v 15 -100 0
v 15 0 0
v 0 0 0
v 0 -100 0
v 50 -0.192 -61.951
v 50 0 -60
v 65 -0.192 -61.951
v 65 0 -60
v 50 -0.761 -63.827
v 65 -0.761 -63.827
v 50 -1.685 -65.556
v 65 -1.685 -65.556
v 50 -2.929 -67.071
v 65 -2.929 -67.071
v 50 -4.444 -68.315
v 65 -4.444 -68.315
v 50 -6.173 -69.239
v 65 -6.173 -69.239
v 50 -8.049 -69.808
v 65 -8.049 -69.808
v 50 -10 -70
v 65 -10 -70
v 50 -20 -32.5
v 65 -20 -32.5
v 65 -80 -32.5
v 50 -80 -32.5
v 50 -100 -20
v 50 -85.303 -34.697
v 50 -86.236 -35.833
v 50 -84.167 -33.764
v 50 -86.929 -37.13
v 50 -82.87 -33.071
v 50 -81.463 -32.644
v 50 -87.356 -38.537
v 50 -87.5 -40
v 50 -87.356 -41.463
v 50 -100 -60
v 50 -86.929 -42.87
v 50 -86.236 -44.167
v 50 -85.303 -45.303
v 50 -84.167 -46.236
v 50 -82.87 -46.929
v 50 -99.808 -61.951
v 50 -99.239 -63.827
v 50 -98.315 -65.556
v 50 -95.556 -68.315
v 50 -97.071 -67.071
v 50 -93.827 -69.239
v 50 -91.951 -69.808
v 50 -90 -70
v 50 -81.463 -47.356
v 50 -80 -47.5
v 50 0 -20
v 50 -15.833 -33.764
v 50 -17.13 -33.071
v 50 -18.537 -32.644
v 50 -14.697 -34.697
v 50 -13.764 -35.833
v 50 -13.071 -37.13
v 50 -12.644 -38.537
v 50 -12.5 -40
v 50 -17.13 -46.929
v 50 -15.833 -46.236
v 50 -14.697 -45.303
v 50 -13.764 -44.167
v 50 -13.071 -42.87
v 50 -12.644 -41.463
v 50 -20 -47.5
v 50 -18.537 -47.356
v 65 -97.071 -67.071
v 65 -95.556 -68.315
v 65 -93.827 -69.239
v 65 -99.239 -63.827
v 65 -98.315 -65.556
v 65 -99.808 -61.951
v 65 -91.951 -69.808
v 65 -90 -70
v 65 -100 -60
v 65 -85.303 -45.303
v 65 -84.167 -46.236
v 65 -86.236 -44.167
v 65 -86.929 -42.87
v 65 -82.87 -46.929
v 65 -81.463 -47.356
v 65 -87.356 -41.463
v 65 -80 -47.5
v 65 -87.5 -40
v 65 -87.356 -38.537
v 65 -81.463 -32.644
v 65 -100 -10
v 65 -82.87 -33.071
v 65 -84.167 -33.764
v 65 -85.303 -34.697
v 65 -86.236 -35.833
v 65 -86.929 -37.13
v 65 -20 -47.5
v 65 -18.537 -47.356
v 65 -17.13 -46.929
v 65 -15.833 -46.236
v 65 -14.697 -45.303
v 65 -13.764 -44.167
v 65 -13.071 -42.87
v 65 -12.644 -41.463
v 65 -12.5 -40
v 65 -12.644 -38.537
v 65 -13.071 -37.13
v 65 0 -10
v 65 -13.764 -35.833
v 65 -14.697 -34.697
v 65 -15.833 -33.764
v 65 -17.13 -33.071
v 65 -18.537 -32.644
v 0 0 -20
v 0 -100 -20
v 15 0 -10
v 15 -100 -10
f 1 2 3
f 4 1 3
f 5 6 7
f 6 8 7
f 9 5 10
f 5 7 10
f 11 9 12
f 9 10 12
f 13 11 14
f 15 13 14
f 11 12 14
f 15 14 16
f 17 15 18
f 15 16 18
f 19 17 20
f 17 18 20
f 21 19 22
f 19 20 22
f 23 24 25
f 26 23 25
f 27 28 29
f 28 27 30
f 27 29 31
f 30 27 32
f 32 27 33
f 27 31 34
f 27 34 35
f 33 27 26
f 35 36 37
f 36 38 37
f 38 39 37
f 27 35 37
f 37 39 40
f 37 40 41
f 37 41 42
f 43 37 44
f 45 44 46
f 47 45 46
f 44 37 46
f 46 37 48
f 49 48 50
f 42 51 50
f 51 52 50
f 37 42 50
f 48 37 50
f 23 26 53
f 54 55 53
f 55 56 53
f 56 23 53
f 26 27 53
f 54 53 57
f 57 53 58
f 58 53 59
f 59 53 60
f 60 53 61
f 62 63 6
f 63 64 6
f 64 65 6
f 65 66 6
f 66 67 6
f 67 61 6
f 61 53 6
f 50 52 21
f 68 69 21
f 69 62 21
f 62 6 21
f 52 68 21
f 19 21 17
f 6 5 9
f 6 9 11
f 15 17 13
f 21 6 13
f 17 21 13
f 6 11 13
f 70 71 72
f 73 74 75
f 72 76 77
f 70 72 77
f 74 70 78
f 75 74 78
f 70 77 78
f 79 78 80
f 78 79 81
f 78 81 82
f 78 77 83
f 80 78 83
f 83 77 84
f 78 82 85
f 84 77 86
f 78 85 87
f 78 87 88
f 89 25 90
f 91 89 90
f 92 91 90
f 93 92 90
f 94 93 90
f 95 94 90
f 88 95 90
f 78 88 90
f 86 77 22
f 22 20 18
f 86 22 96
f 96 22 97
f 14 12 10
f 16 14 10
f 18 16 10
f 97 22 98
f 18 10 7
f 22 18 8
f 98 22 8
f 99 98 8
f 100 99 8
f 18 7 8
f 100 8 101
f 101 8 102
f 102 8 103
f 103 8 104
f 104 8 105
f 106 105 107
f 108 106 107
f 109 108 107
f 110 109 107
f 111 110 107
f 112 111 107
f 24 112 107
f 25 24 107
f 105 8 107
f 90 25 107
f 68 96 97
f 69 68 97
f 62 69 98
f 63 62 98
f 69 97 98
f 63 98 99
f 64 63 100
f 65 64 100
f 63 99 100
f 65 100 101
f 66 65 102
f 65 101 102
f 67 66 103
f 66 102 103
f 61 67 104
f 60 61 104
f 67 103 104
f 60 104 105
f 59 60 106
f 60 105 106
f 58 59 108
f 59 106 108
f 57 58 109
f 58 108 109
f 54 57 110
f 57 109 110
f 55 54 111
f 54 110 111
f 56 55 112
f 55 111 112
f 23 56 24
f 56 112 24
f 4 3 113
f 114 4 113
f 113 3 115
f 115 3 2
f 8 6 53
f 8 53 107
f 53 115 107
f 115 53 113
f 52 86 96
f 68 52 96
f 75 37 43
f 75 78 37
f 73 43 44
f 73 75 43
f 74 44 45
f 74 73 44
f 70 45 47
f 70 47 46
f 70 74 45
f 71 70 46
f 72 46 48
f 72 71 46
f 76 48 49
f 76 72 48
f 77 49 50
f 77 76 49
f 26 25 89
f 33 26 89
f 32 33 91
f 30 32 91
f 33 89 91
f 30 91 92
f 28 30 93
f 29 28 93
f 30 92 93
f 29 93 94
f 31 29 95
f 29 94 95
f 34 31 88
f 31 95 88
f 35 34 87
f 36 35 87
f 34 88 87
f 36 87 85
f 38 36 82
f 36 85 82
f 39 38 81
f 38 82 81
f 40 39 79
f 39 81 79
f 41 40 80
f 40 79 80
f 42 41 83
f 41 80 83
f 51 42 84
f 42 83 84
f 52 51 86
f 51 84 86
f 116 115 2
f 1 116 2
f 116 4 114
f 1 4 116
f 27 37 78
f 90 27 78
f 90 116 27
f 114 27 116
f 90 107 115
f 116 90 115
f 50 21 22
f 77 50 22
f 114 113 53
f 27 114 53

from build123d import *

# Parameters (mm, degrees)
F1_DEPTH = 100
F3_DEPTH = 25
F4_R     = 10


with BuildPart() as f1:
    # F0 (on Front) → F1 (new body)
    with BuildSketch(Plane.XZ):
        Polygon((15, 0), (0, 0), (0, -20), (50, -20), (50, -70), (65, -70), (65, -10), (15, -10), align=None)
    extrude(amount=F1_DEPTH)

    # F2 (on face) → F3 (cut)
    with BuildSketch(Plane.YZ.offset(65)):
        with BuildLine():
            Line((-20, -32.5), (-80, -32.5))
            ThreePointArc((-80, -32.5), (-87.5, -40), (-80, -47.5))
            Line((-80, -47.5), (-20, -47.5))
            ThreePointArc((-20, -47.5), (-12.5, -40), (-20, -32.5))
        make_face()
    extrude(amount=-F3_DEPTH, mode=Mode.SUBTRACT)

    # F4
    f4_edges = [f1.edges().sort_by_distance(p)[0] for p in [
        (57.5, -100, -70),
        (57.5, 0, -70),
    ]]
    fillet(f4_edges, radius=F4_R)


solid = f1.part
